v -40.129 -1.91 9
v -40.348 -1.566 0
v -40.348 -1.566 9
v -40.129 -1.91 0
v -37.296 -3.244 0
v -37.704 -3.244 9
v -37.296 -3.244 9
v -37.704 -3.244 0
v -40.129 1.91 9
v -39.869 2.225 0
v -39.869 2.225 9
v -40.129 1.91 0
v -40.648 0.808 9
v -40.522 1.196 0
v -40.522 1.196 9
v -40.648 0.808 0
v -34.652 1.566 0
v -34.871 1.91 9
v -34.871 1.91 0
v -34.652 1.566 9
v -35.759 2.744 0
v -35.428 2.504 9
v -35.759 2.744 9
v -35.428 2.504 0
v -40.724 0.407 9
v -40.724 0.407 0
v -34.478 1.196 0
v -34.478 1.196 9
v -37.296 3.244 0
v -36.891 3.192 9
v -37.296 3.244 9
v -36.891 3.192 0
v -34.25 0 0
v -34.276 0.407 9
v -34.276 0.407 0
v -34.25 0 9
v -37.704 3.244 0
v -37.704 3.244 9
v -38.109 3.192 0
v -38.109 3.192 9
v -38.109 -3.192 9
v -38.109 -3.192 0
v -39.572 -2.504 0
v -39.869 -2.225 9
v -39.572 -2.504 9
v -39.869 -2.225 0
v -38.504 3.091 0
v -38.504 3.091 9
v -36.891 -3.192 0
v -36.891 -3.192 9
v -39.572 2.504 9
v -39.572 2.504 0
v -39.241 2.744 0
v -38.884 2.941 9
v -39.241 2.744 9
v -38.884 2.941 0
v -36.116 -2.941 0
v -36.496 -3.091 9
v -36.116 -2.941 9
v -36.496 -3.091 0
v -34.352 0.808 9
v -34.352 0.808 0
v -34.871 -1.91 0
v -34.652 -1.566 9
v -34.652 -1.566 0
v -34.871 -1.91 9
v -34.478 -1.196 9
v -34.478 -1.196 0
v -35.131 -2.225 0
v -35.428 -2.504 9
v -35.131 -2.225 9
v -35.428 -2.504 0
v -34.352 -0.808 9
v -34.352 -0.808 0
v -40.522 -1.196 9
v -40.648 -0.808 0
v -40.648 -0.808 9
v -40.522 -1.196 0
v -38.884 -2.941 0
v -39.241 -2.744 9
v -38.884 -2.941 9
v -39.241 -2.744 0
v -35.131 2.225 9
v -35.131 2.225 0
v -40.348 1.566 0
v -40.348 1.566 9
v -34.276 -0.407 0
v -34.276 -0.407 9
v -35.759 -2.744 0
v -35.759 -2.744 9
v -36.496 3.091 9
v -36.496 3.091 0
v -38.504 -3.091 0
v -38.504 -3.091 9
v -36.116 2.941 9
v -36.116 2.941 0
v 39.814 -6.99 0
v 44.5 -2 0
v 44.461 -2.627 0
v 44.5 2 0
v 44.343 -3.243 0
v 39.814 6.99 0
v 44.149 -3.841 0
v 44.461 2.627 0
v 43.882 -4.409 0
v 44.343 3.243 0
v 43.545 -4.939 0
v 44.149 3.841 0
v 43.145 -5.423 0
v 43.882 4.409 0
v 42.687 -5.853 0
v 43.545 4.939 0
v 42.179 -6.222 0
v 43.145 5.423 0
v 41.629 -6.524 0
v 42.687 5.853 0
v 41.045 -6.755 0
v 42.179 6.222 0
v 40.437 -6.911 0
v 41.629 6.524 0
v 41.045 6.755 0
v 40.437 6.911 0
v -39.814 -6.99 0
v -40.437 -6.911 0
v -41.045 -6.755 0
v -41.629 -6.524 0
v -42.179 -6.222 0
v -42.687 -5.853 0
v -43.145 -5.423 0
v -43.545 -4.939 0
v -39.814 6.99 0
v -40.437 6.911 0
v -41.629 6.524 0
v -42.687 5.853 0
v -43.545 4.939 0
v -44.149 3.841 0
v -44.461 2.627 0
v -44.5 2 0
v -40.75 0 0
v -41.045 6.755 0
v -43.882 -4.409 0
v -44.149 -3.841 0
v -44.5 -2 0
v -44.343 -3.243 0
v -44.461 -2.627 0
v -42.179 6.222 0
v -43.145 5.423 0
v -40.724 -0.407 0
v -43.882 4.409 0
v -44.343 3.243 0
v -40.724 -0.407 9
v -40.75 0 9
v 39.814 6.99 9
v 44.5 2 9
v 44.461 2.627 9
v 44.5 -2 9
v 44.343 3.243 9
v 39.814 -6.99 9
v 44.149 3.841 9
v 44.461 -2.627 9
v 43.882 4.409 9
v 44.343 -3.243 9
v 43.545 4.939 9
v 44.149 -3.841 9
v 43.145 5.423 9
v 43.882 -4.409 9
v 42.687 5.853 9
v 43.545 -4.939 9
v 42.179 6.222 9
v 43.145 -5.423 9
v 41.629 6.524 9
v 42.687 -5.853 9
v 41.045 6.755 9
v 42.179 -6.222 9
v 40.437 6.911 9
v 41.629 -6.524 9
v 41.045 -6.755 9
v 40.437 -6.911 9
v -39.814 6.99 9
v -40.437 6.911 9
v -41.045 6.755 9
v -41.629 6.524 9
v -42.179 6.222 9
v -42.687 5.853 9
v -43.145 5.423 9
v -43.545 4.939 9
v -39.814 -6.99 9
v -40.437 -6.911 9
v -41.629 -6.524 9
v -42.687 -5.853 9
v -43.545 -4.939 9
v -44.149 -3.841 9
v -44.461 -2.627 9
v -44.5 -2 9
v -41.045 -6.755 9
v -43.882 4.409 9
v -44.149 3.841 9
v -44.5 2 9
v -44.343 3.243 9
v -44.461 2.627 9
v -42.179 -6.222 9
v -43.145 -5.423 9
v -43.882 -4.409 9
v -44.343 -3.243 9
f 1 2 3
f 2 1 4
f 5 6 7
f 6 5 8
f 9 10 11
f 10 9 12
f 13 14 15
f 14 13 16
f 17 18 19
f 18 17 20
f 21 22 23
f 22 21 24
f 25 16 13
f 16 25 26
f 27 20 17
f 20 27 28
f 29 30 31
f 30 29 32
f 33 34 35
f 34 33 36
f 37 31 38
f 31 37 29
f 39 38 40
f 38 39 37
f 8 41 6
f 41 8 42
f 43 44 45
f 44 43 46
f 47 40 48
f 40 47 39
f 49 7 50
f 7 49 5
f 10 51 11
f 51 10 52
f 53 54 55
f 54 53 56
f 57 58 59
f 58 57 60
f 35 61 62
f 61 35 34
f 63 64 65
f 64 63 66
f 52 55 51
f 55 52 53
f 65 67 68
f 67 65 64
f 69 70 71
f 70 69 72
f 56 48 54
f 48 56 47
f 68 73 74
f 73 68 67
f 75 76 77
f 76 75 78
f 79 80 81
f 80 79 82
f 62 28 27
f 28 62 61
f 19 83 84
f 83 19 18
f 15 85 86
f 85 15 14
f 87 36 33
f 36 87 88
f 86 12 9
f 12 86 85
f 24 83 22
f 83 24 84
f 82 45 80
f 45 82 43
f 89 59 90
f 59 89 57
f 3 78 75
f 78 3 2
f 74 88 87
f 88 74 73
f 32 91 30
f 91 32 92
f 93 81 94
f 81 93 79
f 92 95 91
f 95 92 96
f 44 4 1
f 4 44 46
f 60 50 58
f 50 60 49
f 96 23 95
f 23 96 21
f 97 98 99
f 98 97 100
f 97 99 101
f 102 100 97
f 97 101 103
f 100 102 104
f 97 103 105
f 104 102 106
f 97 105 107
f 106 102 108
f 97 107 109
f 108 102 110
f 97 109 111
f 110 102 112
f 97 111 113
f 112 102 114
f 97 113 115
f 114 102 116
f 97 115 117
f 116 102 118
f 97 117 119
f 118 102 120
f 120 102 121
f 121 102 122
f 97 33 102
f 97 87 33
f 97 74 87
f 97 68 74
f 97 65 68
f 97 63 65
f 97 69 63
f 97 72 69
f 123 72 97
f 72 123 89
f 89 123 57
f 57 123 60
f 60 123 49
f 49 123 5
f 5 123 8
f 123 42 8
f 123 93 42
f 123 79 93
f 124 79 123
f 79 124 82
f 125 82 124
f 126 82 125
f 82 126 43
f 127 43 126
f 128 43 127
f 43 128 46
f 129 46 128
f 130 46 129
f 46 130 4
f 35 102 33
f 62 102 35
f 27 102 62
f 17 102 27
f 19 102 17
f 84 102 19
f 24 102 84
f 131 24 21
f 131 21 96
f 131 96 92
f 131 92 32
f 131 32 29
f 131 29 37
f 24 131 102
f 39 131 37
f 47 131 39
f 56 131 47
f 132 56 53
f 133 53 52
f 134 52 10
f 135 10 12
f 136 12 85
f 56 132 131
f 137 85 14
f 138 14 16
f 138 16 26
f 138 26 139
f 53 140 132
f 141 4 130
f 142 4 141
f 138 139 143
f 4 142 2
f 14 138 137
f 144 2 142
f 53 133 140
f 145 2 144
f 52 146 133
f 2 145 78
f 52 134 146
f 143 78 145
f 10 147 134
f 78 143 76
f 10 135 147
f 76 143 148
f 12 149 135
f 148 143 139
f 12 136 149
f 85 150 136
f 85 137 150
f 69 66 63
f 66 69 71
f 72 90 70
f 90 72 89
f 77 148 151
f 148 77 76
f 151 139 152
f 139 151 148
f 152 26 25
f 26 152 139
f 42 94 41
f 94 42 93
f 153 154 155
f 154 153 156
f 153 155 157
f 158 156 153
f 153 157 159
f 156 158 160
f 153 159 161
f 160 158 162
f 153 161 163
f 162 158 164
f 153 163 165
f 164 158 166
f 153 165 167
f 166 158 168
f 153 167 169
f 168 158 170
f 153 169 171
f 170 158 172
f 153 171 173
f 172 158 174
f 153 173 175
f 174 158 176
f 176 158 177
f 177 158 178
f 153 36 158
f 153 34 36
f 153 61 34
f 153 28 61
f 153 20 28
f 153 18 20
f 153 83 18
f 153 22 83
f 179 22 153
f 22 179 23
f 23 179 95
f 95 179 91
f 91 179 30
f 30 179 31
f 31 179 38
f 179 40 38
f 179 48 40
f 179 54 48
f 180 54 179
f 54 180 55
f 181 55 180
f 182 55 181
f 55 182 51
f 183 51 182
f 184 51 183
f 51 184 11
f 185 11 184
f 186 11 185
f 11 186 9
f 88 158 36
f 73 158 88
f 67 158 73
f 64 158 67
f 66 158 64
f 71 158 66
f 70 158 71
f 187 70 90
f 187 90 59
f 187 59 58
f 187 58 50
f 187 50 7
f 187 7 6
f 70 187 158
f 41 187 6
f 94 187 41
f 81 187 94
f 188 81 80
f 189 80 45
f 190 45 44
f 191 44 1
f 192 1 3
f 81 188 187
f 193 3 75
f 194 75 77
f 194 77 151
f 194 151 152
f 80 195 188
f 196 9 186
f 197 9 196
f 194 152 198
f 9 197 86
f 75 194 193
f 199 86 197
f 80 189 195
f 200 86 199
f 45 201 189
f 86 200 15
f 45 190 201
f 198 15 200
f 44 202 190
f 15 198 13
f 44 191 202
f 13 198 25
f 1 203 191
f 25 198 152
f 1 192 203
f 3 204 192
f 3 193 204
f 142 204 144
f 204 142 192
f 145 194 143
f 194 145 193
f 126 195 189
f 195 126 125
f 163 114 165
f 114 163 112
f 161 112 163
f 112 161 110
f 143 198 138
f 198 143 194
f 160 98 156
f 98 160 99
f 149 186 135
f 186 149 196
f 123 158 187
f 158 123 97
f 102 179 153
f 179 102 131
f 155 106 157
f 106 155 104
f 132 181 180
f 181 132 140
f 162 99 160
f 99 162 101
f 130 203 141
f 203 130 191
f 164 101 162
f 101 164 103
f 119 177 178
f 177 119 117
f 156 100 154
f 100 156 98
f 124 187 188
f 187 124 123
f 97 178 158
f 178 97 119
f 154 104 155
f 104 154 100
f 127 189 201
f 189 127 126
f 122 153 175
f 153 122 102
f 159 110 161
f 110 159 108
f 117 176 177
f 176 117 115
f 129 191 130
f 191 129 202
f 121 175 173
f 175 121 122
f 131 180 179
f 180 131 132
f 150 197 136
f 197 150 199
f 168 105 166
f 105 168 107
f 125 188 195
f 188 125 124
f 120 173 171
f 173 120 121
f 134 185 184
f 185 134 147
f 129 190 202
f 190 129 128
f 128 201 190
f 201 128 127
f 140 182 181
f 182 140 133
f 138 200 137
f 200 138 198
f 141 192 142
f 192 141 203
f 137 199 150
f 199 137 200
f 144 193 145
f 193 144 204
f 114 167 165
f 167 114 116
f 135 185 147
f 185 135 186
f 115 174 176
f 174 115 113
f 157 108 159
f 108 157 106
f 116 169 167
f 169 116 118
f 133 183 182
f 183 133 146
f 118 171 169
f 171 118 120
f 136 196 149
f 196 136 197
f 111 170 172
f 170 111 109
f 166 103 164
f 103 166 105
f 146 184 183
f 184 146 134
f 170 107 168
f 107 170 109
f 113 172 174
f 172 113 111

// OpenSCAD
$fn = 50;


difference() {
	union() {
		hull() {
			translate(v = [-39.5000000000, 2.0000000000, 0]) {
				cylinder(h = 9, r = 5);
			}
			translate(v = [39.5000000000, 2.0000000000, 0]) {
				cylinder(h = 9, r = 5);
			}
			translate(v = [-39.5000000000, -2.0000000000, 0]) {
				cylinder(h = 9, r = 5);
			}
			translate(v = [39.5000000000, -2.0000000000, 0]) {
				cylinder(h = 9, r = 5);
			}
		}
	}
	union() {
		translate(v = [-37.5000000000, 0.0000000000, 0]) {
			cylinder(h = 9, r = 3.2500000000);
		}
		translate(v = [-37.5000000000, 0.0000000000, 0]) {
			cylinder(h = 9, r = 1.8000000000);
		}
		translate(v = [-37.5000000000, 0.0000000000, 0]) {
			cylinder(h = 9, r = 1.8000000000);
		}
		translate(v = [-37.5000000000, 0.0000000000, 0]) {
			cylinder(h = 9, r = 1.8000000000);
		}
	}
}
